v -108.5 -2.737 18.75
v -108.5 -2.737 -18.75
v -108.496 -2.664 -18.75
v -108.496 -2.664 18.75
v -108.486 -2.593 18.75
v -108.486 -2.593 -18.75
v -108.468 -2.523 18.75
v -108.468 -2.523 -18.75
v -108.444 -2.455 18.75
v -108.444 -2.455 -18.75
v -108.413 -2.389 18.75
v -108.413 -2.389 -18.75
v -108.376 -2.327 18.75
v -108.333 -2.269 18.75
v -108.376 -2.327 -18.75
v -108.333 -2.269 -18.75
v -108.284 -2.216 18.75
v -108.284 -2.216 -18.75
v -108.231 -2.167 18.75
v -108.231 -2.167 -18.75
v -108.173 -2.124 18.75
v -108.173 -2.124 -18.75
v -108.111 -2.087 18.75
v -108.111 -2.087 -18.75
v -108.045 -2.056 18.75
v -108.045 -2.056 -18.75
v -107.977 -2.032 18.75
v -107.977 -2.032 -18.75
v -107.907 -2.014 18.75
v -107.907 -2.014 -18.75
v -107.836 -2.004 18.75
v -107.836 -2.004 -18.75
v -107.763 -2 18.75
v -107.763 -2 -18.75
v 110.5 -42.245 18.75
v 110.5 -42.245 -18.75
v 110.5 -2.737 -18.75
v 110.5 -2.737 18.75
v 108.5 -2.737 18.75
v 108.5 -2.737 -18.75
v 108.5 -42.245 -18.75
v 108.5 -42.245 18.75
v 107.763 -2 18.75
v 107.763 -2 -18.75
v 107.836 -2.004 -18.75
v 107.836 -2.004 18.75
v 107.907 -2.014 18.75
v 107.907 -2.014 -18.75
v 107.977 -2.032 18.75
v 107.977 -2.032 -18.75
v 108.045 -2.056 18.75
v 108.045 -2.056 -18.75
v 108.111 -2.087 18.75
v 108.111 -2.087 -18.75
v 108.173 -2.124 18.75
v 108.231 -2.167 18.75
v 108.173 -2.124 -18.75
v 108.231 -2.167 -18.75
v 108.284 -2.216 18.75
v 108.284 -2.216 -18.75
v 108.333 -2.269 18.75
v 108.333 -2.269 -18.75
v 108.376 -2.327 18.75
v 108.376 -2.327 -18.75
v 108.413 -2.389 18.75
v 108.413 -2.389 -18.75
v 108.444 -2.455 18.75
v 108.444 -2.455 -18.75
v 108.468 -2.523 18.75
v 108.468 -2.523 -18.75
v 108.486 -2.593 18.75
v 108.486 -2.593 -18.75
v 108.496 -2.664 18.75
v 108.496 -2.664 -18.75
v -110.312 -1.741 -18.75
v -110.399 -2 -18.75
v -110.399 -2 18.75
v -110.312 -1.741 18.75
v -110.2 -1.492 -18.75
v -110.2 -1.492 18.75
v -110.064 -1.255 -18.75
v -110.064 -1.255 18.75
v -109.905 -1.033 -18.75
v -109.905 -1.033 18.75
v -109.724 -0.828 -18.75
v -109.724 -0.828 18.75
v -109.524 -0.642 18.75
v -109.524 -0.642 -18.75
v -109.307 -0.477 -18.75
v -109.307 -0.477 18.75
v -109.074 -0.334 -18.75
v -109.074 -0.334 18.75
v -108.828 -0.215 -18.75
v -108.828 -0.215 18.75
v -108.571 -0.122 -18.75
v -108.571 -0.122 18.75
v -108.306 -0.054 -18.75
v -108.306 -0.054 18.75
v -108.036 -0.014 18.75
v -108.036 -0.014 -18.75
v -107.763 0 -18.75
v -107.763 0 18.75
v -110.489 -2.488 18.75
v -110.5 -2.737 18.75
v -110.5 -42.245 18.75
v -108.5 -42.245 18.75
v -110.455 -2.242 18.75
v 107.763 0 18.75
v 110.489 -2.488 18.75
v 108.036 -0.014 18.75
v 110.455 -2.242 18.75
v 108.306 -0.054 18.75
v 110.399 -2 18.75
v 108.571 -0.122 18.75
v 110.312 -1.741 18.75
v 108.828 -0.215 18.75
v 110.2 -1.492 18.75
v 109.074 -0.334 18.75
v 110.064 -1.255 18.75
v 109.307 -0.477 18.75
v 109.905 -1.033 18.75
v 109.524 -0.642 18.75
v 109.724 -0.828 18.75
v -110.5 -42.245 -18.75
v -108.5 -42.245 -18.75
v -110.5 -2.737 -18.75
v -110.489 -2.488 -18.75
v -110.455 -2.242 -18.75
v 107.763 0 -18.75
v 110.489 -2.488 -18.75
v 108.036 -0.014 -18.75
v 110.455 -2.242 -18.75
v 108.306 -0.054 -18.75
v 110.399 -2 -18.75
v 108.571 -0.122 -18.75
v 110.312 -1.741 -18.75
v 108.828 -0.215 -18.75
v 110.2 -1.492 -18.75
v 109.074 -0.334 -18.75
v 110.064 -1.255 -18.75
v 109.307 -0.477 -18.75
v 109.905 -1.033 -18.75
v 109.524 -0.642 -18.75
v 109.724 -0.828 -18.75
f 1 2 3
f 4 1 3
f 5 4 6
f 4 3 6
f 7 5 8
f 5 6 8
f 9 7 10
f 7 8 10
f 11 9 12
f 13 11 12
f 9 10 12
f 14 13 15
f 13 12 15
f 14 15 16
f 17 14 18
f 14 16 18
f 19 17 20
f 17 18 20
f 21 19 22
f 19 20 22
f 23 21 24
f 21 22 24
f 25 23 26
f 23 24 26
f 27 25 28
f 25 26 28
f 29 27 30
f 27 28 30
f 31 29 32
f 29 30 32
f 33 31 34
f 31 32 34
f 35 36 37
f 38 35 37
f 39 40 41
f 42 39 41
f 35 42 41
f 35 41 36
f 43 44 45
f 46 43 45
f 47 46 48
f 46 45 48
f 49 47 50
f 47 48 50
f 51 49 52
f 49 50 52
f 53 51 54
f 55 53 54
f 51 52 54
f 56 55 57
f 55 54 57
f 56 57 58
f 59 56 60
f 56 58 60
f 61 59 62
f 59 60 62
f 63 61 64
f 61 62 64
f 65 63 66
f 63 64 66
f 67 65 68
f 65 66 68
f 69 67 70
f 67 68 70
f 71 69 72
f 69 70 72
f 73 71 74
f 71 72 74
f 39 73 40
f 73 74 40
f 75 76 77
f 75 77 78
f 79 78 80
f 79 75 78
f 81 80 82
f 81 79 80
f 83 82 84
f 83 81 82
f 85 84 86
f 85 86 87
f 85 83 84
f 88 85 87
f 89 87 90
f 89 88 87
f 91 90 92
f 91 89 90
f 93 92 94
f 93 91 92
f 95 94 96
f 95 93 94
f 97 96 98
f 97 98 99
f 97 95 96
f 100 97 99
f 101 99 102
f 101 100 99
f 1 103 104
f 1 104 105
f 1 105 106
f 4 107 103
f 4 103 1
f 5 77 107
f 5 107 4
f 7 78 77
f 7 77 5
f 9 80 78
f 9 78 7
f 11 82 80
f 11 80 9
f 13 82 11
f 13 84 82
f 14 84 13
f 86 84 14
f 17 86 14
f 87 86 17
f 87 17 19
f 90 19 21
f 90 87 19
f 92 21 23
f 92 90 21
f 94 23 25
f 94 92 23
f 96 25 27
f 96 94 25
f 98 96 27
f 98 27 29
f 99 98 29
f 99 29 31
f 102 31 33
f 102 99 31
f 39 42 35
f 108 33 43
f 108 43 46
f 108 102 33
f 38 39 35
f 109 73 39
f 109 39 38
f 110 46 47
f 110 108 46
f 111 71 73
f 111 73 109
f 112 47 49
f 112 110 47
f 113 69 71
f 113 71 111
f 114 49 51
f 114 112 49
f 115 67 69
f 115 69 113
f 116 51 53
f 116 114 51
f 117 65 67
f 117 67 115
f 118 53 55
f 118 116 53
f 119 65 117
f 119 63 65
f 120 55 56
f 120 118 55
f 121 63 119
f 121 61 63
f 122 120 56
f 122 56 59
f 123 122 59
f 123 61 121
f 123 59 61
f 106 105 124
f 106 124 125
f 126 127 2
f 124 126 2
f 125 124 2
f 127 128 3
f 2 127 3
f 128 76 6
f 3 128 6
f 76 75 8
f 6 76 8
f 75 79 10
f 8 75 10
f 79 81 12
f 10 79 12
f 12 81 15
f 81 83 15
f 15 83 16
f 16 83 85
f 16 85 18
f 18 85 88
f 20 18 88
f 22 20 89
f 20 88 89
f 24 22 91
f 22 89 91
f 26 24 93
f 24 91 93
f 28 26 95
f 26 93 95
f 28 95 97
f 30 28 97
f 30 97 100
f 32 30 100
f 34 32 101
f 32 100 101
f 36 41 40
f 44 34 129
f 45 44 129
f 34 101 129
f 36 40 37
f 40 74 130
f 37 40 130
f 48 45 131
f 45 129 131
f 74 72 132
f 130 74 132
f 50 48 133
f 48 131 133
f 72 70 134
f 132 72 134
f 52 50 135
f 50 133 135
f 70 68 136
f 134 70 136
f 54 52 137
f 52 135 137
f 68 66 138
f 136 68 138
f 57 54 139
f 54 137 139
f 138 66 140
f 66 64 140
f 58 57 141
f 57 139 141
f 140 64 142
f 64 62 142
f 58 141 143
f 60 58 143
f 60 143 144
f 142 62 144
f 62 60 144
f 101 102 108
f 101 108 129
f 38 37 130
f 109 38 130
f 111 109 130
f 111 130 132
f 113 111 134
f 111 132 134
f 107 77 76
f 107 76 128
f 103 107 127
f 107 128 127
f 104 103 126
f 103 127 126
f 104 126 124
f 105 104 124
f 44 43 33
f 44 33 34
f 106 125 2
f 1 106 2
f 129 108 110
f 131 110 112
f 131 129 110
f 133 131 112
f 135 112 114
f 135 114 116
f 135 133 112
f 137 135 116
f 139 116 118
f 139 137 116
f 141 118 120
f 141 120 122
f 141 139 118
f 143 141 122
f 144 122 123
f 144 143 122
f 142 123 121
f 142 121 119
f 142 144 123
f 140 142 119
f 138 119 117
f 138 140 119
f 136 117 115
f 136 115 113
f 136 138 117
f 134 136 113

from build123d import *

# Parameters (mm, degrees)
SKETCH_1_W             = 37.5
SKETCH_1_H             = 2
SM_BASE_FLANGE_1_DEPTH = 150
OTHER_START            = -18.75
OTHER_1_DEPTH          = 37.5
OTHER_1_2_DEPTH        = 37.5


# Read off the part's stored shape, not the designer's step: 绘制的折弯1
# Sheet-metal steps are written as plain solids
with BuildPart() as part:
    # Sketch 1 → 基体-法兰1 (new, symmetric)
    with BuildSketch(Plane(origin=(0, 0, 0), x_dir=(0, 0, -1), z_dir=(1, 0, 0))):
        with Locations((0, -1)):
            Rectangle(SKETCH_1_W, SKETCH_1_H)
    extrude(amount=SM_BASE_FLANGE_1_DEPTH, both=True)

    # Other 1 outline → Other 1 (cut)
    with BuildSketch(Plane.XY.offset(OTHER_START)):
        with BuildLine():
            ThreePointArc((-110.399002398, -2), (-109.417667209, -0.556604688), (-107.7634, 0))
            Line((-107.7634, 0), (-150, 0))
            Line((-150, 0), (-150, -2))
            Line((-150, -2), (-110.399002398, -2))
        make_face()
        with BuildLine():
            Line((150, 0), (107.7634, 0))
            ThreePointArc((107.7634, 0), (109.417667209, -0.556604688), (110.399002398, -2))
            Line((110.399002398, -2), (150, -2))
            Line((150, -2), (150, 0))
        make_face()
    extrude(amount=OTHER_1_DEPTH, mode=Mode.SUBTRACT)

    # Other 1 2 outline → Other 1 2 (add)
    with BuildSketch(Plane.XY.offset(OTHER_START)):
        with BuildLine():
            Line((-107.7634, -2), (-110.399002398, -2))
            ThreePointArc((-110.399002398, -2), (-110.474633029, -2.364854094), (-110.5, -2.7366))
            Line((-110.5, -2.7366), (-110.5, -42.245355099))
            Line((-110.5, -42.245355099), (-108.5, -42.245355099))
            Line((-108.5, -42.245355099), (-108.5, -2.7366))
            ThreePointArc((-108.5, -2.7366), (-108.284254855, -2.215745145), (-107.7634, -2))
        make_face()
        with BuildLine():
            ThreePointArc((110.5, -2.7366), (110.474633029, -2.364854094), (110.399002398, -2))
            Line((110.399002398, -2), (107.7634, -2))
            ThreePointArc((107.7634, -2), (108.284254855, -2.215745145), (108.5, -2.7366))
            Line((108.5, -2.7366), (108.5, -42.245355099))
            Line((108.5, -42.245355099), (110.5, -42.245355099))
            Line((110.5, -42.245355099), (110.5, -2.7366))
        make_face()
    extrude(amount=OTHER_1_2_DEPTH)


solid = part.part
